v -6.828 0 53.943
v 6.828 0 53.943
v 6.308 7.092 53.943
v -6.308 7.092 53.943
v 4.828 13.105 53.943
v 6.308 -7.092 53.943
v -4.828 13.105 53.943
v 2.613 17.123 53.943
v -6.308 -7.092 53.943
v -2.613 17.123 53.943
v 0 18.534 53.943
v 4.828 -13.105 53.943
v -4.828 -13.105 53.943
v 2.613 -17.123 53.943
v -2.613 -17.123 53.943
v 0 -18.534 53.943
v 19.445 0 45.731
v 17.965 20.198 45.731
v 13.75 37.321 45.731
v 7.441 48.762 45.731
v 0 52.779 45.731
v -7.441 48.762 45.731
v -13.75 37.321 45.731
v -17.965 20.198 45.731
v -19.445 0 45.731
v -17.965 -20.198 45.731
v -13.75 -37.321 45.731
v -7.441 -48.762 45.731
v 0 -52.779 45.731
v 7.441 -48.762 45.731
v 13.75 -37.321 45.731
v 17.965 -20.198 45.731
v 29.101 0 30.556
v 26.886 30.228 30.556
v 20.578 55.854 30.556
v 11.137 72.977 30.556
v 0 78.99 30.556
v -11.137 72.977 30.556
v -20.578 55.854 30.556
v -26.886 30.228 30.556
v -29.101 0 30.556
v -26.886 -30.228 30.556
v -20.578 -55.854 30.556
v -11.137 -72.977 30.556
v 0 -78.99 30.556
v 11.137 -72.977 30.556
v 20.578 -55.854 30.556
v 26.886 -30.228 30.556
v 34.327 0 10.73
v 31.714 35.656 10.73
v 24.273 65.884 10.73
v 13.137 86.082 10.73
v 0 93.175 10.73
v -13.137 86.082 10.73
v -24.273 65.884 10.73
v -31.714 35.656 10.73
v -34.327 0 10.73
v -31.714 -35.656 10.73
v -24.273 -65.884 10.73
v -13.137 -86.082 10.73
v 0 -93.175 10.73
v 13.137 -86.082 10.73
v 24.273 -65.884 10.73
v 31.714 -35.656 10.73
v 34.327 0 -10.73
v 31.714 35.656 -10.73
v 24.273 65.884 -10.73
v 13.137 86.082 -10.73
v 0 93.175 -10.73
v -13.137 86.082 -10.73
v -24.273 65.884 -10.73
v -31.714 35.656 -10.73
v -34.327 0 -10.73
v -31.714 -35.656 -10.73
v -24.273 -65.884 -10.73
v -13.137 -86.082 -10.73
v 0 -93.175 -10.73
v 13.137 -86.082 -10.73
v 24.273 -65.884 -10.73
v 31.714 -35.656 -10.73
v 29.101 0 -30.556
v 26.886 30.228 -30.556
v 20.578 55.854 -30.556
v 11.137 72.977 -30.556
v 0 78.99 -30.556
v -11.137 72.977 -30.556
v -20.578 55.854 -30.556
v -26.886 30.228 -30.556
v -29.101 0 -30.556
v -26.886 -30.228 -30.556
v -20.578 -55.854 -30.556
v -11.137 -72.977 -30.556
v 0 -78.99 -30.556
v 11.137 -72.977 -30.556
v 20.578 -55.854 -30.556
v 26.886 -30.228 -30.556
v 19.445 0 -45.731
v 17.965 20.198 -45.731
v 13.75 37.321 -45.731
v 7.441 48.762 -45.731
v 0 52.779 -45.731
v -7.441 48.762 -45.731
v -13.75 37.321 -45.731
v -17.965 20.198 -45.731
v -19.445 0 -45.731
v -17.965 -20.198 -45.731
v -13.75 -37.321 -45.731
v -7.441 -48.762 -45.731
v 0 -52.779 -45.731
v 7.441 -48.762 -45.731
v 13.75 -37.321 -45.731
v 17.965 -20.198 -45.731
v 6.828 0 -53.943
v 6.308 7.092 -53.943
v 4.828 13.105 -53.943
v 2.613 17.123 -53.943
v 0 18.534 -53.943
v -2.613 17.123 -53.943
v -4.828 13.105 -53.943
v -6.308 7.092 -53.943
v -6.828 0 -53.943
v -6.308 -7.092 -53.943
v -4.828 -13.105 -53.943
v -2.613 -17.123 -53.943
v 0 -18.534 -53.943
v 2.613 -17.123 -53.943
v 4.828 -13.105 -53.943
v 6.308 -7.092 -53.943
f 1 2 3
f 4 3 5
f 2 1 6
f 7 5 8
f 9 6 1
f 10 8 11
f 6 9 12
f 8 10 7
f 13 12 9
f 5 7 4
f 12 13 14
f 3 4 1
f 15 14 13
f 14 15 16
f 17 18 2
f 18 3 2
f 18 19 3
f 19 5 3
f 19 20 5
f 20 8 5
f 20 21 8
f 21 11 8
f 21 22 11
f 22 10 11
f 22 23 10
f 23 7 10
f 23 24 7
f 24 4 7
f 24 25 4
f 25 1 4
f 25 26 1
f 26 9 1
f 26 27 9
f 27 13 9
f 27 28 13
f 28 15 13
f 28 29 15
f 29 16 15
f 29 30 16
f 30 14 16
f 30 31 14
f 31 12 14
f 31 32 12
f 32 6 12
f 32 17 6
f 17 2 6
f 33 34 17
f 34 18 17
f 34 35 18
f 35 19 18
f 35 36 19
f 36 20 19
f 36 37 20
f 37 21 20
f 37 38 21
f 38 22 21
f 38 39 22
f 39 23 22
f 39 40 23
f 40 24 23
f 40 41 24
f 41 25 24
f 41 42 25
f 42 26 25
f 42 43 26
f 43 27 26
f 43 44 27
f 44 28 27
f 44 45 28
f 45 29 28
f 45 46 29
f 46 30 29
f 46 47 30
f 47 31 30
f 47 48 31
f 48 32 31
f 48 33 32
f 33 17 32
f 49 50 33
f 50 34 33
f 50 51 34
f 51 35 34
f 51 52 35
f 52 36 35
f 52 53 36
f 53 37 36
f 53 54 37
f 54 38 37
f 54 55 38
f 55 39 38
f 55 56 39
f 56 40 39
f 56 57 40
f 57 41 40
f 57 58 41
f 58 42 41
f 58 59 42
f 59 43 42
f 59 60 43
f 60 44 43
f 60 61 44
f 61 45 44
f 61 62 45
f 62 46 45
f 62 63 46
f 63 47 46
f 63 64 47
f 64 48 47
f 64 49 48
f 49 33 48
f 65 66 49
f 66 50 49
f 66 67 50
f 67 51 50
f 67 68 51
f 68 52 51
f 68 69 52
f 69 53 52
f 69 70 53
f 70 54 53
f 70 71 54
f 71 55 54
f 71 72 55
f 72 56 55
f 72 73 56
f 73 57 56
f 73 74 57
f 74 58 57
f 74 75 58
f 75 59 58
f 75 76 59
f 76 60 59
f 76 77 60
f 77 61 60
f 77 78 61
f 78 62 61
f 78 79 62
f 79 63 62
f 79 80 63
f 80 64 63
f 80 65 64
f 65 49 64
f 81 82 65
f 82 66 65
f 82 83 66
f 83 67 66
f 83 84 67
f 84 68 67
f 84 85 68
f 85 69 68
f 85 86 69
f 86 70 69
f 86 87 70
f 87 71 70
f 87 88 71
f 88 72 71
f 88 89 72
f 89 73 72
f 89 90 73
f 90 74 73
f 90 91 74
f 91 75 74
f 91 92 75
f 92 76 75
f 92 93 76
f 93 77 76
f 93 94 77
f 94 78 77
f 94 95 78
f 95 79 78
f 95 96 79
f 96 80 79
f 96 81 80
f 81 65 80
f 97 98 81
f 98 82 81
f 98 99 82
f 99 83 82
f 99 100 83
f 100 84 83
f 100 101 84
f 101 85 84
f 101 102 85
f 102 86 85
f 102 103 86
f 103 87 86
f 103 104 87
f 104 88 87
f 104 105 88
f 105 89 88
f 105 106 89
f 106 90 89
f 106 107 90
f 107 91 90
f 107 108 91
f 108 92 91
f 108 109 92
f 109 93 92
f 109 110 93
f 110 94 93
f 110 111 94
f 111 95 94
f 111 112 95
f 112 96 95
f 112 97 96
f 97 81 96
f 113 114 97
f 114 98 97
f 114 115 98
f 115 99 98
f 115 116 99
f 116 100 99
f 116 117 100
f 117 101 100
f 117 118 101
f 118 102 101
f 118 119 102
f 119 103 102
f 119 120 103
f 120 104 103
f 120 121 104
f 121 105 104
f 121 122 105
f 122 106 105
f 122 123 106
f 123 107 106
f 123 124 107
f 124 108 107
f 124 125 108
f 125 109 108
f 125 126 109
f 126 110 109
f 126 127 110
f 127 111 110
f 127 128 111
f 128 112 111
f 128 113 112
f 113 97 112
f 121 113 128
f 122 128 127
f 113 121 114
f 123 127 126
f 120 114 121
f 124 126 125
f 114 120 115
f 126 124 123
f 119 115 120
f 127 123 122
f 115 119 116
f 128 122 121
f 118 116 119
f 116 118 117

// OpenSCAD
// Generated by SolidPython 1.0.1 on 2020-07-29 00:46:48


scale(v = [7, 19, 11]) {
	sphere(r = 5);
}
/***********************************************
*********      SolidPython code:      **********
************************************************
 
# import packages: SolidPython
from solid import *
from solid.utils import *
from itertools import chain, combinations, permutations


class Resize:

    def __init__(self, scad_file):
        self.scad_file = scad_file
        #self.scad_file = import_scad(scad_file)
        # cone/cylinder param:
        self.r1 = 0
        self.r2 = 0
        self.h = 0
        # rectangular prism param:
        self.w = 0
        self.l = 0
        # ellipse param:
        self.r = 0

    # import OpenScad code (file name corresponds to shape)


    # classify shape + parameters
    def assign(self, param1, param2, param3):
        if self.scad_file == 'cone.scad':
            self.r1 = param1
            self.r2 = param2
            self.h = param3
        elif self.scad_file == 'cylinder.scad':
            self.r1 = param1
            self.r2 = param2
            self.h = param3
        elif self.scad_file == 'rectangularPrism.scad':
            self.h = param1
            self.l = param2
            self.w = param3
        else:
            self.r = param1
            self.h = param2

    # resize parameters
    def iterate(self):
        x = range(3, 20, 2)
        i = 1
        if self.scad_file == 'cone.scad':
            tempList = list(permutations(x, 2))
            for temp in tempList:
                param1 = temp[0]
                param2 = temp[1]
                filepath = 'produced_scad_files/' + 'cone' + str(param1) + '_' + str(param2) + '_' + '.scad'
                scad_render_to_file(cylinder(h=param1, r1=param2, r2=0), filepath)

        elif self.scad_file == 'cylinder.scad':
            tempList = list(permutations(x, 3))
            for temp in tempList:
                param1 = temp[0]
                param2 = temp[1]
                filepath = 'produced_scad_files/' + 'cylinder' + str(param1) + '_' + str(param2) + '_' + '.scad'
                scad_render_to_file(cylinder(h=param1, r1=param2, r2=param2), filepath)

        elif self.scad_file == 'rectangularPrism.scad':
            tempList = list(permutations(x, 3))
            for temp in tempList:
                param1 = temp[0]
                param2 = temp[1]
                param3 = temp[2]
                filepath = 'produced_scad_files/' + 'rectangularPrism' + str(param1) + '_' + str(param2) + '_' + str(
                    param3) + '.scad'
                scad_render_to_file(cube(size=(param1, param2, param3)), filepath)

        elif self.scad_file == 'ellipse.scad':
            tempList = list(permutations(x, 4))
            for temp in tempList:
                param1 = temp[0]
                param2 = temp[1]
                param3 = temp[2]
                param4 = temp[3]
                filepath = 'produced_scad_files/' + 'ellipse' + str(param1) + '_' + str(param2) + '_' + str(param3) + '_' + str(param4) + '.scad'
                scad_render_to_file(scale([param1, param2, param3])(sphere(r=param4)), filepath)

    def render_to_scadfile(self):
        scad_render_to_file(scad, 'example.scad') 
 
************************************************/
